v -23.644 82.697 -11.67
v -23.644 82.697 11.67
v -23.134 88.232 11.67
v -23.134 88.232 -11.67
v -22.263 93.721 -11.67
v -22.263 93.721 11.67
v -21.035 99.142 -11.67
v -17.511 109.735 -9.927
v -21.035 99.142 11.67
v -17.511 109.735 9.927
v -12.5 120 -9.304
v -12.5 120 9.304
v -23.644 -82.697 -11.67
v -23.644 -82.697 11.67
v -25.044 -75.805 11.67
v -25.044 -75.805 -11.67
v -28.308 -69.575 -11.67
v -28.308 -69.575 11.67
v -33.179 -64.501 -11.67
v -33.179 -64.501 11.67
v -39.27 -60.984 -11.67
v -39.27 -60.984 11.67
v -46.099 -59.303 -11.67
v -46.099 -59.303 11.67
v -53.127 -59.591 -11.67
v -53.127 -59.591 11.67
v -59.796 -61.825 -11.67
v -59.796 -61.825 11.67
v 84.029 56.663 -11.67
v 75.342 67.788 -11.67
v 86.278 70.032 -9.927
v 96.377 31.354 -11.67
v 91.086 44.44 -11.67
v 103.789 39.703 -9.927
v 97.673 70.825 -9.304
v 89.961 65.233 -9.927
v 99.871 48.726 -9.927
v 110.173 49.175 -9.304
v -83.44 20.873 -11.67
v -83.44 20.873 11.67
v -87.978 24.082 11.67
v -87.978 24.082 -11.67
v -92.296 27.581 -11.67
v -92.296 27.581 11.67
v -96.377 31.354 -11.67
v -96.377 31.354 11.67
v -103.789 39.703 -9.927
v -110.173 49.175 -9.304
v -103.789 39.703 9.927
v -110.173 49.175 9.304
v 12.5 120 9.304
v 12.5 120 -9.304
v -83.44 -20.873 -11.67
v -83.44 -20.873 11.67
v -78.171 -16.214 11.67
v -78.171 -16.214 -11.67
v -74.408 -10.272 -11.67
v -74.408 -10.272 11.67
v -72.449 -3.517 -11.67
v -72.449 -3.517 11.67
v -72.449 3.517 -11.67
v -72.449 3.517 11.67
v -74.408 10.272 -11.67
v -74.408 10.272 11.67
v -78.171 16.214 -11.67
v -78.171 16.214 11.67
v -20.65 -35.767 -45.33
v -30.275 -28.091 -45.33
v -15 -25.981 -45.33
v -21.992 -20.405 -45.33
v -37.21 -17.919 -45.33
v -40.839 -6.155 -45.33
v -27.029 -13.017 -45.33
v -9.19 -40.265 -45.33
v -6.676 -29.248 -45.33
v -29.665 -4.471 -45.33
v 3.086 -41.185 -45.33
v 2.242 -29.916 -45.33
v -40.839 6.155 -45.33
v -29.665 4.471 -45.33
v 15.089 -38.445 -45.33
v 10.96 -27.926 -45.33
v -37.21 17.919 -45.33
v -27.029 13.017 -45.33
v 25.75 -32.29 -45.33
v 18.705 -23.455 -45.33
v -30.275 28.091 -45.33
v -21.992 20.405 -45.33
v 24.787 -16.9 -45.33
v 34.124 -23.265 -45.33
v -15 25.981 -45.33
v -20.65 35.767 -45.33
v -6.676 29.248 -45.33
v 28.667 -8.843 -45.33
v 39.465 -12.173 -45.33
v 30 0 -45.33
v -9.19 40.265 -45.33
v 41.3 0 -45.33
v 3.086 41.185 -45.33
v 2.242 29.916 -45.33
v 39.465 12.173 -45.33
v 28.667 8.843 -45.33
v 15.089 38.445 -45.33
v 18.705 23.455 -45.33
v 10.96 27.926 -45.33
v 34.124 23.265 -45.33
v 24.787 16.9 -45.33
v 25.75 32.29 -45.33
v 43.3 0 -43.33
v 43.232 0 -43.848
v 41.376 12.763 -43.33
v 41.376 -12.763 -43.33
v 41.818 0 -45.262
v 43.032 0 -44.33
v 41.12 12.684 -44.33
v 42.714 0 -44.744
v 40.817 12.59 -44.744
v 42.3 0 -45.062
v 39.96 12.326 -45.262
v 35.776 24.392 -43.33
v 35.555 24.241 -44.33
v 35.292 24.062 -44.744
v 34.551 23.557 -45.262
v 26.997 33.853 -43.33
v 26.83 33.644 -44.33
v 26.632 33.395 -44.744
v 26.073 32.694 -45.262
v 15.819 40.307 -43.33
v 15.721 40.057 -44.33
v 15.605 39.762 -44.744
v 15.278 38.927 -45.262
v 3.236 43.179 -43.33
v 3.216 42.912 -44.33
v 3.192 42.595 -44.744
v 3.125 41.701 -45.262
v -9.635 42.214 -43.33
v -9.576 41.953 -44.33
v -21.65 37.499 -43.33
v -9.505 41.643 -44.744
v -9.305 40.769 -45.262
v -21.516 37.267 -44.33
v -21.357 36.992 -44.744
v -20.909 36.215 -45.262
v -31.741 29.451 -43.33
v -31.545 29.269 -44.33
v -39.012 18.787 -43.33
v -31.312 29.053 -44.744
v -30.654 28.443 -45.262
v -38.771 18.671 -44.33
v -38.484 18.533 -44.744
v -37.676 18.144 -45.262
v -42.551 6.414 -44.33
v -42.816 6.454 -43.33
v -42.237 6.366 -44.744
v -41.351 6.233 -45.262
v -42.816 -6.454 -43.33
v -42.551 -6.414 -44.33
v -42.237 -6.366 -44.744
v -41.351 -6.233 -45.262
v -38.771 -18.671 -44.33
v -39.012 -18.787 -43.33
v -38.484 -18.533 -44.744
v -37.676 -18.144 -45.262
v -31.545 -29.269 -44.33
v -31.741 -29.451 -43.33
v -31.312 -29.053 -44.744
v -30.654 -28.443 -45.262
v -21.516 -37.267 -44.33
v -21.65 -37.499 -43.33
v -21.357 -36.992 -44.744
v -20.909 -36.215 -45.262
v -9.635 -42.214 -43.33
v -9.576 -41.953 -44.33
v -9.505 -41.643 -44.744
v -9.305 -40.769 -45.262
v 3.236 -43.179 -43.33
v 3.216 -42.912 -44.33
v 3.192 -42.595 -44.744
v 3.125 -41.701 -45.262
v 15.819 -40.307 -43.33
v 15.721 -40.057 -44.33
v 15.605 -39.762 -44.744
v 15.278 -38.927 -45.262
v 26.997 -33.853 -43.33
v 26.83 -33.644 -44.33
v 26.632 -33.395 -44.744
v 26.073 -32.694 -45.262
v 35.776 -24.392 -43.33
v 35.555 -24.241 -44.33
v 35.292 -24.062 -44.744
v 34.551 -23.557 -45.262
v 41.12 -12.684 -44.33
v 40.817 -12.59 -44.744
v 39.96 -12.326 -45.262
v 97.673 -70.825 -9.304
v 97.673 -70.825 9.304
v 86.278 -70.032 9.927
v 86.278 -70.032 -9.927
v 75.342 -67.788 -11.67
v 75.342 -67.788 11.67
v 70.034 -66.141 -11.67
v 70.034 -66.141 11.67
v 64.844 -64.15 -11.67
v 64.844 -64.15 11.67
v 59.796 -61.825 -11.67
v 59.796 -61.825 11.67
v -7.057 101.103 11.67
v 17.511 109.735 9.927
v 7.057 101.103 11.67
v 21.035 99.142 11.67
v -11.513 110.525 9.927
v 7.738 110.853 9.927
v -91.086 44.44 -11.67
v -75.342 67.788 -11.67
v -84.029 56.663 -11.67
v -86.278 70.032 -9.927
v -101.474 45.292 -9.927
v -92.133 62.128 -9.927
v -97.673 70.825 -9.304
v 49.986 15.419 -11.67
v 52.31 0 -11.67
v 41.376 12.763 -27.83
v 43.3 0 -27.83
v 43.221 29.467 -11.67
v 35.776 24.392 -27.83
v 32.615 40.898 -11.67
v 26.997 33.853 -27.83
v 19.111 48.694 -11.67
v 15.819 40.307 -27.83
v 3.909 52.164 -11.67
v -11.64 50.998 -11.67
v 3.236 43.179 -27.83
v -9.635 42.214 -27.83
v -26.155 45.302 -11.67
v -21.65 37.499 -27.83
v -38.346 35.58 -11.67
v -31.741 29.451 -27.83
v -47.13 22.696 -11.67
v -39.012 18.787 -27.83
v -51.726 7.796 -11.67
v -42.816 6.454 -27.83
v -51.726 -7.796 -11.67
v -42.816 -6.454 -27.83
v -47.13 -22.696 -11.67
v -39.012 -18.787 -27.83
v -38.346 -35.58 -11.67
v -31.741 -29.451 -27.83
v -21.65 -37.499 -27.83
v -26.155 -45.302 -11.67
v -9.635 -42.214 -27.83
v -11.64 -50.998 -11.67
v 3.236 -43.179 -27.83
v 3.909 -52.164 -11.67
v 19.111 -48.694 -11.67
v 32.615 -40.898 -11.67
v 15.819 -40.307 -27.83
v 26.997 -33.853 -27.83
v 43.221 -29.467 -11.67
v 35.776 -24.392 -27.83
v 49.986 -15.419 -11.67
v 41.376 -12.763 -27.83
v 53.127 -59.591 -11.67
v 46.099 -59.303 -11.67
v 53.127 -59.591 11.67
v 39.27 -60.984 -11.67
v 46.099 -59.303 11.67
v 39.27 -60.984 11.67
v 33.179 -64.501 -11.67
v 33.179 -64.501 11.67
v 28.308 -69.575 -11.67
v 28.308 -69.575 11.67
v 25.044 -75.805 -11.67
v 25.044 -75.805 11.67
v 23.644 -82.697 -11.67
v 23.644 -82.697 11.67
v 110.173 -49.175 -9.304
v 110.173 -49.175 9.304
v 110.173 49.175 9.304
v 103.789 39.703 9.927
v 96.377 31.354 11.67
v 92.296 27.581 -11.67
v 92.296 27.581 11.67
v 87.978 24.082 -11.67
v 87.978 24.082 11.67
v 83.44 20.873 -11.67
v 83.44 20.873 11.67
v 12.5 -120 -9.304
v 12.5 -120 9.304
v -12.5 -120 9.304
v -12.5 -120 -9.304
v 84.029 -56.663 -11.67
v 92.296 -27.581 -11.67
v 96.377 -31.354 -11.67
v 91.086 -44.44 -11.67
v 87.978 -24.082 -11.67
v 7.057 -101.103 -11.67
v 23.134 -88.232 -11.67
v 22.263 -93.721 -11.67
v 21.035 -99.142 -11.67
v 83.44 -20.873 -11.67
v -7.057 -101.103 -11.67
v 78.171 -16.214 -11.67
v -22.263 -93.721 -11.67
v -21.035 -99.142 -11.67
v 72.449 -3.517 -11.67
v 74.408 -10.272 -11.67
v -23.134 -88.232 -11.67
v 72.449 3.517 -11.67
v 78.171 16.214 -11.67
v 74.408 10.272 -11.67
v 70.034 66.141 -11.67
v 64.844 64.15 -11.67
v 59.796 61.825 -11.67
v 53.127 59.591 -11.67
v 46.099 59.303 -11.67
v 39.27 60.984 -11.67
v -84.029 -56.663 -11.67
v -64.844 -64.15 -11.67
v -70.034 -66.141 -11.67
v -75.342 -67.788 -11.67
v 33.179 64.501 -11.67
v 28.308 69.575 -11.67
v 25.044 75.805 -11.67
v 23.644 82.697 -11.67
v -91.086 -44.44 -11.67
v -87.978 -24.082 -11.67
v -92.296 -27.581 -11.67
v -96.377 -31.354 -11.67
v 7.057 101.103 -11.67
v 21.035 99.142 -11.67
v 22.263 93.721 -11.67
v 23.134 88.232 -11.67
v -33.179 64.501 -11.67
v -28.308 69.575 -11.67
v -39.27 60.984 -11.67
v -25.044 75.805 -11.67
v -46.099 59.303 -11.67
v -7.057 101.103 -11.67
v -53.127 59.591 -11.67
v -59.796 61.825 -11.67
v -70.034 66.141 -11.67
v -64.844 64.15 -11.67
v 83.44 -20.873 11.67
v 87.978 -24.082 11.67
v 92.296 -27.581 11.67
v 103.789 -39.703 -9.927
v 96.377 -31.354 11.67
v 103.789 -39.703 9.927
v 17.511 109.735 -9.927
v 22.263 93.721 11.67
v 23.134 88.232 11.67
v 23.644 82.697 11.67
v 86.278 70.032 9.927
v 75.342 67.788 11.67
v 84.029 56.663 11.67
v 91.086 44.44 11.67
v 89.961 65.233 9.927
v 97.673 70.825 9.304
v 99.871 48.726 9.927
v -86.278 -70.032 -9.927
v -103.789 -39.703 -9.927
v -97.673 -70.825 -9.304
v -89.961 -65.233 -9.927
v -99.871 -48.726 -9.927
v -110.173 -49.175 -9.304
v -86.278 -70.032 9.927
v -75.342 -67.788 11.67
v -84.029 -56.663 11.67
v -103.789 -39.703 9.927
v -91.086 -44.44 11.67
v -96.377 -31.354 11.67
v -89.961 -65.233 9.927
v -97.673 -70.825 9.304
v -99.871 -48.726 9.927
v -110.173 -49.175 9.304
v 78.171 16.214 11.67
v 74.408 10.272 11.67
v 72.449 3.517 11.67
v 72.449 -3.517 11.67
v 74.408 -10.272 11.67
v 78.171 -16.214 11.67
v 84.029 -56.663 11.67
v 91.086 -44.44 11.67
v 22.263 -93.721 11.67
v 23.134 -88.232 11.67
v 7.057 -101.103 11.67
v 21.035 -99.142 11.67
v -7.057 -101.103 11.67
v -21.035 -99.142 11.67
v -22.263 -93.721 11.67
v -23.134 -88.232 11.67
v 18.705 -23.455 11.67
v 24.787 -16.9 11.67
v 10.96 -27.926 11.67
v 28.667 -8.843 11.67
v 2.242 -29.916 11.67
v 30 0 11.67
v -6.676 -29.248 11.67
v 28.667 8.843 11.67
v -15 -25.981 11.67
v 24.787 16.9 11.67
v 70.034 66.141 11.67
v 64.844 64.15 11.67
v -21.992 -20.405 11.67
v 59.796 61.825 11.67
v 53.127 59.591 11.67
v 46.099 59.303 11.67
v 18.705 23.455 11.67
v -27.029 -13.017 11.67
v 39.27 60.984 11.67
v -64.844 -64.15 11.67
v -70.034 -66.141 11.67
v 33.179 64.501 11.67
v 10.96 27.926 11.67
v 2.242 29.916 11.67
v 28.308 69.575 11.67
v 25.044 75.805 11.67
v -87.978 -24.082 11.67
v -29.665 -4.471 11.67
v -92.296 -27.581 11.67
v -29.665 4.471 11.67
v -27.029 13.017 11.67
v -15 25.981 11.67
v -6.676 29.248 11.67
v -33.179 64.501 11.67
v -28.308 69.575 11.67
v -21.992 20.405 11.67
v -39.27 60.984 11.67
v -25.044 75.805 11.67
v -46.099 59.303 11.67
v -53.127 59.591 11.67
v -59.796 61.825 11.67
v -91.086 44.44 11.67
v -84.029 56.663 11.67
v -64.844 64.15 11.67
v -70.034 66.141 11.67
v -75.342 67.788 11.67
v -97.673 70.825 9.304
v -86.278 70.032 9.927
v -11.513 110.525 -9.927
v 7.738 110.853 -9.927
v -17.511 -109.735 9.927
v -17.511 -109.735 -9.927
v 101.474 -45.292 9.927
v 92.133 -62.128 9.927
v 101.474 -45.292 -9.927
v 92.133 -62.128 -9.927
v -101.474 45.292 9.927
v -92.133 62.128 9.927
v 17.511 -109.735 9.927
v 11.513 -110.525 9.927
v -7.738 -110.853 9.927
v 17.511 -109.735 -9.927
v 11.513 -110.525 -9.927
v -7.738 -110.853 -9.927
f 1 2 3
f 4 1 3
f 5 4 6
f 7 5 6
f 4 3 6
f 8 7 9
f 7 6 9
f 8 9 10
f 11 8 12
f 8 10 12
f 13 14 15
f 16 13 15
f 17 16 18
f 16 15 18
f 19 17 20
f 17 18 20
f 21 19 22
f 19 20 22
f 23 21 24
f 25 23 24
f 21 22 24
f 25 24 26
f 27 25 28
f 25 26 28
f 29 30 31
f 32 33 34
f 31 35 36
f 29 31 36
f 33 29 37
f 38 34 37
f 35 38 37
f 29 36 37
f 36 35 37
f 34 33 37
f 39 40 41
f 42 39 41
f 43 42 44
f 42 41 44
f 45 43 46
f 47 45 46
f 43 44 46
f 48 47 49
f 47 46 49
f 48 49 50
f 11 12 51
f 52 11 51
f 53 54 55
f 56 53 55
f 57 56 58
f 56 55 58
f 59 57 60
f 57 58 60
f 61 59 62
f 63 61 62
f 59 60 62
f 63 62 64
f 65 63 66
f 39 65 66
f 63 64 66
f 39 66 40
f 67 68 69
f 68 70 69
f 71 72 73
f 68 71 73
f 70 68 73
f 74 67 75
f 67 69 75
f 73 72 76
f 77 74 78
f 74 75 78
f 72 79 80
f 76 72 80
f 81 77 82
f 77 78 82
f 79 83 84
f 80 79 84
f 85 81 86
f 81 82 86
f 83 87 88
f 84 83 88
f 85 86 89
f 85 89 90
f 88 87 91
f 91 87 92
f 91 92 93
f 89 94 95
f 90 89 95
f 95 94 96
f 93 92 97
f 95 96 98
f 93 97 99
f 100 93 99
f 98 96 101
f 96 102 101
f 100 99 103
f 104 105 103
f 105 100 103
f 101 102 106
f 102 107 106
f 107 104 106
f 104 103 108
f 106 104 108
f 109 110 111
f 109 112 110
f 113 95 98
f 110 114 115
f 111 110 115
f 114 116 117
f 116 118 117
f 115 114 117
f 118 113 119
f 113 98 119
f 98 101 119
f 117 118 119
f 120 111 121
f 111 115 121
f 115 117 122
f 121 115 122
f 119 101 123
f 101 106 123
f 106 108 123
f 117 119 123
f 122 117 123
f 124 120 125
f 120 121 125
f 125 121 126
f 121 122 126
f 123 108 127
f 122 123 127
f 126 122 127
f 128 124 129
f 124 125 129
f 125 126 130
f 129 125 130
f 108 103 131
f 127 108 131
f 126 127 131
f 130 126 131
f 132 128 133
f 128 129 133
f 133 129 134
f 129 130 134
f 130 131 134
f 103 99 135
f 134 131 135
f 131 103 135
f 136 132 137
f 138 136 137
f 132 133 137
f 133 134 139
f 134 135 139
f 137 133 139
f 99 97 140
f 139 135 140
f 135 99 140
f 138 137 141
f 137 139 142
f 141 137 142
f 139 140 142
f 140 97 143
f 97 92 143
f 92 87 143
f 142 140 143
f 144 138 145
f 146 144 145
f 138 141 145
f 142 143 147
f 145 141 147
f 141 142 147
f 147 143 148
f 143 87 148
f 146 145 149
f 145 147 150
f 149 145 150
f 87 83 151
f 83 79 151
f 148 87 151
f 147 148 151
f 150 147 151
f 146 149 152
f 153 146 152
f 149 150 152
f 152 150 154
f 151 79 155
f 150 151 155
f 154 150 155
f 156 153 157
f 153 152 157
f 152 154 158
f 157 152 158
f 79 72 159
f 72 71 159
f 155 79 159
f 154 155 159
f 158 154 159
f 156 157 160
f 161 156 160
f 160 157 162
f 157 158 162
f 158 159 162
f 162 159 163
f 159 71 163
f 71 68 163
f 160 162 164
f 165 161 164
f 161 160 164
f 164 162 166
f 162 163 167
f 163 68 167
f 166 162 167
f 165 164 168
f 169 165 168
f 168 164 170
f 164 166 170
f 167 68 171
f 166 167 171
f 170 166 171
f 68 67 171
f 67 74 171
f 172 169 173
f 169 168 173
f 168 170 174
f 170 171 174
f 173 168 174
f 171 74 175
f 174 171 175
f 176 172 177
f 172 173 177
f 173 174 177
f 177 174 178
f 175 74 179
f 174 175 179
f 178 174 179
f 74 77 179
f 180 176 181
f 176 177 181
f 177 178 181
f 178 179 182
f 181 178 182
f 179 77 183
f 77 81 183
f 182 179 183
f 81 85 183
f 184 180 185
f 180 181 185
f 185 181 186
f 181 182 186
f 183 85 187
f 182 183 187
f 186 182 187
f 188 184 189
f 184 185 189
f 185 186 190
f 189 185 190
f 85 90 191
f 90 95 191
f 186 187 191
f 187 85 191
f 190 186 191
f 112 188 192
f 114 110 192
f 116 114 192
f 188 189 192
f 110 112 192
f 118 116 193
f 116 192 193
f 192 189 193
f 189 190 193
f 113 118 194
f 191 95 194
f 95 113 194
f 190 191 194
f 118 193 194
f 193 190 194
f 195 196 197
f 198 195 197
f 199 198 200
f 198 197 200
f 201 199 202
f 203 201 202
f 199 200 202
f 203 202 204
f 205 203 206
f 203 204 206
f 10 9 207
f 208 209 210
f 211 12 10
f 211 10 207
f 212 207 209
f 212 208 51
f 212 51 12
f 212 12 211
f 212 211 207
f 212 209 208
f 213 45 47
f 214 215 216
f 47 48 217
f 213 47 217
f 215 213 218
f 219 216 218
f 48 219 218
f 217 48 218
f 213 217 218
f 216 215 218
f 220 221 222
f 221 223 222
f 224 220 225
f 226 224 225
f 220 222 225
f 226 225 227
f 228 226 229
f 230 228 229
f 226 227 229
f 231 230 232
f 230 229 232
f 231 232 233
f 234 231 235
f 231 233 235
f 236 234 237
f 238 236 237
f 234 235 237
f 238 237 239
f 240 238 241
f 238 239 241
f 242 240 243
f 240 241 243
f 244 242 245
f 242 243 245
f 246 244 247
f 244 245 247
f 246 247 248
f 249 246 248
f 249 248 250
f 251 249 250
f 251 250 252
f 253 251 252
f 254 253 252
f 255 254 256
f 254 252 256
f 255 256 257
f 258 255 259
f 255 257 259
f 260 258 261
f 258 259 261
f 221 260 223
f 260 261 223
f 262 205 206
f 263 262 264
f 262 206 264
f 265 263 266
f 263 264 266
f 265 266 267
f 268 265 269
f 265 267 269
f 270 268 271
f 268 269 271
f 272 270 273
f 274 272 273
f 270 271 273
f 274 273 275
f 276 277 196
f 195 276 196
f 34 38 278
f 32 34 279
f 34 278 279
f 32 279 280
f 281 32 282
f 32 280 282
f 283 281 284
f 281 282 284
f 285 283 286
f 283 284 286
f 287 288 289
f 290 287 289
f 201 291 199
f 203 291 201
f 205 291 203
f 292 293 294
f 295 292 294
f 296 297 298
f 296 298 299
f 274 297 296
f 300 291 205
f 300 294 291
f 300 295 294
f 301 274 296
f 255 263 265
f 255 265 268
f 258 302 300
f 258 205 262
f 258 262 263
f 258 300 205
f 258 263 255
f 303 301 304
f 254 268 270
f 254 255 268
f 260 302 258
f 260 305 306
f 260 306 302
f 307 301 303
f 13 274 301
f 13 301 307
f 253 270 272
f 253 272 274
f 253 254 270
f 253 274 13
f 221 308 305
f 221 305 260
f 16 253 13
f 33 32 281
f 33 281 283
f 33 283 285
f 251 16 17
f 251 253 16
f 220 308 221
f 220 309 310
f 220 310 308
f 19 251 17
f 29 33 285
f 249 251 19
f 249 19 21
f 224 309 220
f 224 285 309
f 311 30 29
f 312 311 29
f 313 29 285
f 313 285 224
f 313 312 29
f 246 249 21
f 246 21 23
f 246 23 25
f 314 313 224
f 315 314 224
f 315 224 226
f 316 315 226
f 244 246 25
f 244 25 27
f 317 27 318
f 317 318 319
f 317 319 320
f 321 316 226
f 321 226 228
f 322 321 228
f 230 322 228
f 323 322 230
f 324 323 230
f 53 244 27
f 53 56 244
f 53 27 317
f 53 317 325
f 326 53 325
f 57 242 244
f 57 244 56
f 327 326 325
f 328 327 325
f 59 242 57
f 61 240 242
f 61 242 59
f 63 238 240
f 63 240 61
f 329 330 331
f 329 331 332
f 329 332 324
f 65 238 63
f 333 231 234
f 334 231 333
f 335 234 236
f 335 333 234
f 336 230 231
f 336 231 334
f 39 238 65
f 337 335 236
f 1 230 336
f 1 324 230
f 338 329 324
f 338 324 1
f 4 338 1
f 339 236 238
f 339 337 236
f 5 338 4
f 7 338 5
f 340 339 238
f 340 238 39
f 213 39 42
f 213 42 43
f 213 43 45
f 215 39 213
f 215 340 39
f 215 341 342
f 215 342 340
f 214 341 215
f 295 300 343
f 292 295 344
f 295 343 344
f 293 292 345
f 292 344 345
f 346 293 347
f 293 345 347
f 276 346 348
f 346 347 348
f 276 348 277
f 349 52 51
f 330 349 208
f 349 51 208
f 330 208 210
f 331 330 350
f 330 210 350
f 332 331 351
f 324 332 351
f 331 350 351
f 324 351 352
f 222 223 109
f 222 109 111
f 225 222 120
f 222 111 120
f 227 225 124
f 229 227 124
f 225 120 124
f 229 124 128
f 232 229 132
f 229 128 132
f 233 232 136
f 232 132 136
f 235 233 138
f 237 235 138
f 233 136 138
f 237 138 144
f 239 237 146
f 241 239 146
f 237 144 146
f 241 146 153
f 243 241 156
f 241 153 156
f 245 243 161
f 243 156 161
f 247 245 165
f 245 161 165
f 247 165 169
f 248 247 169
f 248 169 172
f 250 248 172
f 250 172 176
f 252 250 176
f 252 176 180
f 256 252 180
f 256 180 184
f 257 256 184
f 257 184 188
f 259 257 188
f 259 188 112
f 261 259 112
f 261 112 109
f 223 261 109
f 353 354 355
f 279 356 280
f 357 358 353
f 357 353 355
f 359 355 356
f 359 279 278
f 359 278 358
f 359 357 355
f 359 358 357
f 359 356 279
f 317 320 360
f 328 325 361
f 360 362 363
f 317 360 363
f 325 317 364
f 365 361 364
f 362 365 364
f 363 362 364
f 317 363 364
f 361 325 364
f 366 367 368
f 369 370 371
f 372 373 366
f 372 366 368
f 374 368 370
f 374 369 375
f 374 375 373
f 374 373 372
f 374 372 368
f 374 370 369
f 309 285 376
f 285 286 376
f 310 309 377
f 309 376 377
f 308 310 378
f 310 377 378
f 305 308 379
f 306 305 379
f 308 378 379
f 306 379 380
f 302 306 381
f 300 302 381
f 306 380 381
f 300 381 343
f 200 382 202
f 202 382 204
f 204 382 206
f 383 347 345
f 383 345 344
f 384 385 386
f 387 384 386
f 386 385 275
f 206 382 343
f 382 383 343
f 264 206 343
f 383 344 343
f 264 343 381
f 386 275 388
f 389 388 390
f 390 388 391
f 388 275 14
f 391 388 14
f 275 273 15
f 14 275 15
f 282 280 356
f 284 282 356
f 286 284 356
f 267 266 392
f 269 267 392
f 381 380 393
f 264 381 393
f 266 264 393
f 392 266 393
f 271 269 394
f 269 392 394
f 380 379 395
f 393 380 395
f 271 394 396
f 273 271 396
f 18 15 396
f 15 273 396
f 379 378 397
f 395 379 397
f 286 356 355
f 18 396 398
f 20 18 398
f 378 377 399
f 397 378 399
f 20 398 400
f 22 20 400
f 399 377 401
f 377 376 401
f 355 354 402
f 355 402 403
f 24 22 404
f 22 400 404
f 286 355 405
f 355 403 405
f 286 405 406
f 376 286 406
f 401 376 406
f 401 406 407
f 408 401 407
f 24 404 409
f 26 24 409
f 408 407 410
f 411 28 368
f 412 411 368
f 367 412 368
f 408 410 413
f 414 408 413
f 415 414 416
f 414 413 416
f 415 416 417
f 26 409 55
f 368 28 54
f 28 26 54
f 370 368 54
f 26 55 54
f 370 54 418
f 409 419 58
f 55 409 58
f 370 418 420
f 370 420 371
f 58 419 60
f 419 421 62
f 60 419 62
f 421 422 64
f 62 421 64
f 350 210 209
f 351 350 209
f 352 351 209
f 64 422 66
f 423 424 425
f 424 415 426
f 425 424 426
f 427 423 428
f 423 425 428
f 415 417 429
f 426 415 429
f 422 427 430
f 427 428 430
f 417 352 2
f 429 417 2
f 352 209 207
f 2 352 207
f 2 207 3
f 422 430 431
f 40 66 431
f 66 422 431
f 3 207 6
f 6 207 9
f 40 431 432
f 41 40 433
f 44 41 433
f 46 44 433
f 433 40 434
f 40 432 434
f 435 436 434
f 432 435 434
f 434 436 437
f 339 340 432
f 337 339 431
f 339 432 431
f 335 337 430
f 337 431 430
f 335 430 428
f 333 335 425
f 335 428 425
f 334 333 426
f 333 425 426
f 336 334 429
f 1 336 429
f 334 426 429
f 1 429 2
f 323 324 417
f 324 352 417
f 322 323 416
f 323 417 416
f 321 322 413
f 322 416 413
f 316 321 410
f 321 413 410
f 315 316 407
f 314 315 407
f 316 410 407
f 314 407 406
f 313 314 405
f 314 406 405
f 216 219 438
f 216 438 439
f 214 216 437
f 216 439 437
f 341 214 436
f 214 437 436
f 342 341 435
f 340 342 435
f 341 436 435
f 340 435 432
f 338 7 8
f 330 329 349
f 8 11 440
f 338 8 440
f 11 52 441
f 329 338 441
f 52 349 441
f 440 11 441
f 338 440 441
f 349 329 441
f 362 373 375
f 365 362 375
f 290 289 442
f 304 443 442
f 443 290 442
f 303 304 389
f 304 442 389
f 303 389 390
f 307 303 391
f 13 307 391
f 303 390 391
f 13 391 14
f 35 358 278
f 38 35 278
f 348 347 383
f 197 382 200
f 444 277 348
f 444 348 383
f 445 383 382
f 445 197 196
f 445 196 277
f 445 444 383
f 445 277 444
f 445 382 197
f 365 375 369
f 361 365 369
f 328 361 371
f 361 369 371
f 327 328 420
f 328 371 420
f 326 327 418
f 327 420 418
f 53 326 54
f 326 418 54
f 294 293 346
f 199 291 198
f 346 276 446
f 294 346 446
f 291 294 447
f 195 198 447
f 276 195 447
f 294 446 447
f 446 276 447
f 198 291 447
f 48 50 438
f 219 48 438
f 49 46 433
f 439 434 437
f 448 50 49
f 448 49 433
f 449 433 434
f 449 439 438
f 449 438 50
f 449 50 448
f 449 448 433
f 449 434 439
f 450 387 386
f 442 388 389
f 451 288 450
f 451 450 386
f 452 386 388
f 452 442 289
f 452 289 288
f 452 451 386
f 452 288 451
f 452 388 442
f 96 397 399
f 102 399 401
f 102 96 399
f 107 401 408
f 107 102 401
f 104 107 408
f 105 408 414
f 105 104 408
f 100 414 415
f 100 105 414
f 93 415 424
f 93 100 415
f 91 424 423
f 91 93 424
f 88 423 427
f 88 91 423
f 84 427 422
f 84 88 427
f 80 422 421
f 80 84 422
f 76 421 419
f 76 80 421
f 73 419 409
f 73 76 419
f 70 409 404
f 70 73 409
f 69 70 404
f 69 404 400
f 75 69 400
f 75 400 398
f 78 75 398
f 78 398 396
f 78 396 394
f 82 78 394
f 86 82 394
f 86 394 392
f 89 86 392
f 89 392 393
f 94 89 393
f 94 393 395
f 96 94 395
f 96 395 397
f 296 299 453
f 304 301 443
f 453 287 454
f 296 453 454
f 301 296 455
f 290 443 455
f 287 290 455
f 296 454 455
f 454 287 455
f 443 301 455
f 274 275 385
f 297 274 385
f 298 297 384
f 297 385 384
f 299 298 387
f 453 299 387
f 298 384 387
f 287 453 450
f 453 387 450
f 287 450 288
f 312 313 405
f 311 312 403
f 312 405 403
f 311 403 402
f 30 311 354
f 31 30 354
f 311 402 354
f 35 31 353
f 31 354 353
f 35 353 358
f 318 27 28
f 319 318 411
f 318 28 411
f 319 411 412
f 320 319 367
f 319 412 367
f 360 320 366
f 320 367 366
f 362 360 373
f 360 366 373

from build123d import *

# Parameters (mm, degrees)
SKETCH2_R           = 30
BOSS_EXTRUDE1_DEPTH = 11.67
BOSS_EXTRUDE2_START = -57
SKETCH4_R           = 43.3
SKETCH4_R_2         = 30
BOSS_EXTRUDE2_DEPTH = 57
FILLET1_R           = 2


with BuildPart() as part:
    # Sketch2 → Boss-Extrude1 (new, symmetric)
    with BuildSketch(Plane.XY):
        with BuildLine():
            Line((-12.5, 120), (12.5, 120))
            ThreePointArc((12.5, 120), (20.236345621, 101.995330975), (23.643859133, 82.697455395))
            ThreePointArc((23.643859133, 82.697455395), (36.1, 62.527034153), (59.796167634, 61.824910351))
            ThreePointArc((59.796167634, 61.824910351), (78.212374881, 68.522854875), (97.673048454, 70.825317547))
            Line((97.673048454, 70.825317547), (110.173048454, 49.174682453))
            ThreePointArc((110.173048454, 49.174682453), (98.448720503, 33.4724761), (83.440026767, 20.872545044))
            ThreePointArc((83.440026767, 20.872545044), (72.2, 0), (83.440026767, -20.872545044))
            ThreePointArc((83.440026767, -20.872545044), (98.448720503, -33.4724761), (110.173048454, -49.174682453))
            Line((110.173048454, -49.174682453), (97.673048454, -70.825317547))
            ThreePointArc((97.673048454, -70.825317547), (78.212374881, -68.522854875), (59.796167634, -61.824910351))
            ThreePointArc((59.796167634, -61.824910351), (36.1, -62.527034153), (23.643859133, -82.697455395))
            ThreePointArc((23.643859133, -82.697455395), (20.236345621, -101.995330975), (12.5, -120))
            Line((12.5, -120), (-12.5, -120))
            ThreePointArc((-12.5, -120), (-20.236345621, -101.995330975), (-23.643859133, -82.697455395))
            ThreePointArc((-23.643859133, -82.697455395), (-36.1, -62.527034153), (-59.796167634, -61.824910351))
            ThreePointArc((-59.796167634, -61.824910351), (-78.212374881, -68.522854875), (-97.673048454, -70.825317547))
            Line((-97.673048454, -70.825317547), (-110.173048454, -49.174682453))
            ThreePointArc((-110.173048454, -49.174682453), (-98.448720503, -33.4724761), (-83.440026767, -20.872545044))
            ThreePointArc((-83.440026767, -20.872545044), (-72.2, 0), (-83.440026767, 20.872545044))
            ThreePointArc((-83.440026767, 20.872545044), (-98.448720503, 33.4724761), (-110.173048454, 49.174682453))
            Line((-110.173048454, 49.174682453), (-97.673048454, 70.825317547))
            ThreePointArc((-97.673048454, 70.825317547), (-78.212374881, 68.522854875), (-59.796167634, 61.824910351))
            ThreePointArc((-59.796167634, 61.824910351), (-36.1, 62.527034153), (-23.643859133, 82.697455395))
            ThreePointArc((-23.643859133, 82.697455395), (-20.236345621, 101.995330975), (-12.5, 120))
        make_face()
        Circle(SKETCH2_R, mode=Mode.SUBTRACT)
    extrude(amount=BOSS_EXTRUDE1_DEPTH, both=True)

    # Sketch3 → Cut-Revolve3 (revolve, cut)
    with BuildSketch(Plane(origin=(0, 0, 0), x_dir=(0, 0, -1), z_dir=(1, 0, 0))):
        with BuildLine():
            Line((-9.298765392, 121.603522868), (-9.298765392, 129.425144156))
            Line((-9.298765392, 129.425144156), (-28.94821126, 129.425144156))
            Line((-28.94821126, 129.425144156), (-28.94821126, 101.348727697))
            Line((-28.94821126, 101.348727697), (-11.67, 101.348727697))
            ThreePointArc((-11.67, 101.348727697), (-9.89359142, 111.406961181), (-9.298765392, 121.603522868))
        make_face()
    cut_revolve3 = revolve(axis=Axis((0, 0, 0), (0, 0, -1)), mode=Mode.SUBTRACT)

    # Mirror1: Cut-Revolve3 across plane
    add(cut_revolve3.mirror(Plane.XY), mode=Mode.SUBTRACT)

    # Sketch4 → Boss-Extrude2 (add)
    with BuildSketch(Plane.XY.offset(11.67).offset(BOSS_EXTRUDE2_START)):
        Circle(SKETCH4_R)
        Circle(SKETCH4_R_2, mode=Mode.SUBTRACT)
    extrude(amount=BOSS_EXTRUDE2_DEPTH)

    # Sketch5 → Revolve1 (revolve)
    with BuildSketch(Plane(origin=(0, 0, 0), x_dir=(0, 0, -1), z_dir=(1, 0, 0)), mode=Mode.PRIVATE) as revolve1_sk:
        Polygon((27.83, 43.3), (11.67, 43.3), (11.67, 52.31), align=None)
    revolve(revolve1_sk.sketch.rotate(Axis((0, 0, 0), (0, 0, 1)), 270), axis=Axis((0, 0, 0), (0, 0, 1)))

    # Fillet1
    fillet1_edges = [part.edges().sort_by_distance(p)[0] for p in [
        (-43.3, 0, -45.33),
    ]]
    fillet(fillet1_edges, radius=FILLET1_R)


solid = part.part
